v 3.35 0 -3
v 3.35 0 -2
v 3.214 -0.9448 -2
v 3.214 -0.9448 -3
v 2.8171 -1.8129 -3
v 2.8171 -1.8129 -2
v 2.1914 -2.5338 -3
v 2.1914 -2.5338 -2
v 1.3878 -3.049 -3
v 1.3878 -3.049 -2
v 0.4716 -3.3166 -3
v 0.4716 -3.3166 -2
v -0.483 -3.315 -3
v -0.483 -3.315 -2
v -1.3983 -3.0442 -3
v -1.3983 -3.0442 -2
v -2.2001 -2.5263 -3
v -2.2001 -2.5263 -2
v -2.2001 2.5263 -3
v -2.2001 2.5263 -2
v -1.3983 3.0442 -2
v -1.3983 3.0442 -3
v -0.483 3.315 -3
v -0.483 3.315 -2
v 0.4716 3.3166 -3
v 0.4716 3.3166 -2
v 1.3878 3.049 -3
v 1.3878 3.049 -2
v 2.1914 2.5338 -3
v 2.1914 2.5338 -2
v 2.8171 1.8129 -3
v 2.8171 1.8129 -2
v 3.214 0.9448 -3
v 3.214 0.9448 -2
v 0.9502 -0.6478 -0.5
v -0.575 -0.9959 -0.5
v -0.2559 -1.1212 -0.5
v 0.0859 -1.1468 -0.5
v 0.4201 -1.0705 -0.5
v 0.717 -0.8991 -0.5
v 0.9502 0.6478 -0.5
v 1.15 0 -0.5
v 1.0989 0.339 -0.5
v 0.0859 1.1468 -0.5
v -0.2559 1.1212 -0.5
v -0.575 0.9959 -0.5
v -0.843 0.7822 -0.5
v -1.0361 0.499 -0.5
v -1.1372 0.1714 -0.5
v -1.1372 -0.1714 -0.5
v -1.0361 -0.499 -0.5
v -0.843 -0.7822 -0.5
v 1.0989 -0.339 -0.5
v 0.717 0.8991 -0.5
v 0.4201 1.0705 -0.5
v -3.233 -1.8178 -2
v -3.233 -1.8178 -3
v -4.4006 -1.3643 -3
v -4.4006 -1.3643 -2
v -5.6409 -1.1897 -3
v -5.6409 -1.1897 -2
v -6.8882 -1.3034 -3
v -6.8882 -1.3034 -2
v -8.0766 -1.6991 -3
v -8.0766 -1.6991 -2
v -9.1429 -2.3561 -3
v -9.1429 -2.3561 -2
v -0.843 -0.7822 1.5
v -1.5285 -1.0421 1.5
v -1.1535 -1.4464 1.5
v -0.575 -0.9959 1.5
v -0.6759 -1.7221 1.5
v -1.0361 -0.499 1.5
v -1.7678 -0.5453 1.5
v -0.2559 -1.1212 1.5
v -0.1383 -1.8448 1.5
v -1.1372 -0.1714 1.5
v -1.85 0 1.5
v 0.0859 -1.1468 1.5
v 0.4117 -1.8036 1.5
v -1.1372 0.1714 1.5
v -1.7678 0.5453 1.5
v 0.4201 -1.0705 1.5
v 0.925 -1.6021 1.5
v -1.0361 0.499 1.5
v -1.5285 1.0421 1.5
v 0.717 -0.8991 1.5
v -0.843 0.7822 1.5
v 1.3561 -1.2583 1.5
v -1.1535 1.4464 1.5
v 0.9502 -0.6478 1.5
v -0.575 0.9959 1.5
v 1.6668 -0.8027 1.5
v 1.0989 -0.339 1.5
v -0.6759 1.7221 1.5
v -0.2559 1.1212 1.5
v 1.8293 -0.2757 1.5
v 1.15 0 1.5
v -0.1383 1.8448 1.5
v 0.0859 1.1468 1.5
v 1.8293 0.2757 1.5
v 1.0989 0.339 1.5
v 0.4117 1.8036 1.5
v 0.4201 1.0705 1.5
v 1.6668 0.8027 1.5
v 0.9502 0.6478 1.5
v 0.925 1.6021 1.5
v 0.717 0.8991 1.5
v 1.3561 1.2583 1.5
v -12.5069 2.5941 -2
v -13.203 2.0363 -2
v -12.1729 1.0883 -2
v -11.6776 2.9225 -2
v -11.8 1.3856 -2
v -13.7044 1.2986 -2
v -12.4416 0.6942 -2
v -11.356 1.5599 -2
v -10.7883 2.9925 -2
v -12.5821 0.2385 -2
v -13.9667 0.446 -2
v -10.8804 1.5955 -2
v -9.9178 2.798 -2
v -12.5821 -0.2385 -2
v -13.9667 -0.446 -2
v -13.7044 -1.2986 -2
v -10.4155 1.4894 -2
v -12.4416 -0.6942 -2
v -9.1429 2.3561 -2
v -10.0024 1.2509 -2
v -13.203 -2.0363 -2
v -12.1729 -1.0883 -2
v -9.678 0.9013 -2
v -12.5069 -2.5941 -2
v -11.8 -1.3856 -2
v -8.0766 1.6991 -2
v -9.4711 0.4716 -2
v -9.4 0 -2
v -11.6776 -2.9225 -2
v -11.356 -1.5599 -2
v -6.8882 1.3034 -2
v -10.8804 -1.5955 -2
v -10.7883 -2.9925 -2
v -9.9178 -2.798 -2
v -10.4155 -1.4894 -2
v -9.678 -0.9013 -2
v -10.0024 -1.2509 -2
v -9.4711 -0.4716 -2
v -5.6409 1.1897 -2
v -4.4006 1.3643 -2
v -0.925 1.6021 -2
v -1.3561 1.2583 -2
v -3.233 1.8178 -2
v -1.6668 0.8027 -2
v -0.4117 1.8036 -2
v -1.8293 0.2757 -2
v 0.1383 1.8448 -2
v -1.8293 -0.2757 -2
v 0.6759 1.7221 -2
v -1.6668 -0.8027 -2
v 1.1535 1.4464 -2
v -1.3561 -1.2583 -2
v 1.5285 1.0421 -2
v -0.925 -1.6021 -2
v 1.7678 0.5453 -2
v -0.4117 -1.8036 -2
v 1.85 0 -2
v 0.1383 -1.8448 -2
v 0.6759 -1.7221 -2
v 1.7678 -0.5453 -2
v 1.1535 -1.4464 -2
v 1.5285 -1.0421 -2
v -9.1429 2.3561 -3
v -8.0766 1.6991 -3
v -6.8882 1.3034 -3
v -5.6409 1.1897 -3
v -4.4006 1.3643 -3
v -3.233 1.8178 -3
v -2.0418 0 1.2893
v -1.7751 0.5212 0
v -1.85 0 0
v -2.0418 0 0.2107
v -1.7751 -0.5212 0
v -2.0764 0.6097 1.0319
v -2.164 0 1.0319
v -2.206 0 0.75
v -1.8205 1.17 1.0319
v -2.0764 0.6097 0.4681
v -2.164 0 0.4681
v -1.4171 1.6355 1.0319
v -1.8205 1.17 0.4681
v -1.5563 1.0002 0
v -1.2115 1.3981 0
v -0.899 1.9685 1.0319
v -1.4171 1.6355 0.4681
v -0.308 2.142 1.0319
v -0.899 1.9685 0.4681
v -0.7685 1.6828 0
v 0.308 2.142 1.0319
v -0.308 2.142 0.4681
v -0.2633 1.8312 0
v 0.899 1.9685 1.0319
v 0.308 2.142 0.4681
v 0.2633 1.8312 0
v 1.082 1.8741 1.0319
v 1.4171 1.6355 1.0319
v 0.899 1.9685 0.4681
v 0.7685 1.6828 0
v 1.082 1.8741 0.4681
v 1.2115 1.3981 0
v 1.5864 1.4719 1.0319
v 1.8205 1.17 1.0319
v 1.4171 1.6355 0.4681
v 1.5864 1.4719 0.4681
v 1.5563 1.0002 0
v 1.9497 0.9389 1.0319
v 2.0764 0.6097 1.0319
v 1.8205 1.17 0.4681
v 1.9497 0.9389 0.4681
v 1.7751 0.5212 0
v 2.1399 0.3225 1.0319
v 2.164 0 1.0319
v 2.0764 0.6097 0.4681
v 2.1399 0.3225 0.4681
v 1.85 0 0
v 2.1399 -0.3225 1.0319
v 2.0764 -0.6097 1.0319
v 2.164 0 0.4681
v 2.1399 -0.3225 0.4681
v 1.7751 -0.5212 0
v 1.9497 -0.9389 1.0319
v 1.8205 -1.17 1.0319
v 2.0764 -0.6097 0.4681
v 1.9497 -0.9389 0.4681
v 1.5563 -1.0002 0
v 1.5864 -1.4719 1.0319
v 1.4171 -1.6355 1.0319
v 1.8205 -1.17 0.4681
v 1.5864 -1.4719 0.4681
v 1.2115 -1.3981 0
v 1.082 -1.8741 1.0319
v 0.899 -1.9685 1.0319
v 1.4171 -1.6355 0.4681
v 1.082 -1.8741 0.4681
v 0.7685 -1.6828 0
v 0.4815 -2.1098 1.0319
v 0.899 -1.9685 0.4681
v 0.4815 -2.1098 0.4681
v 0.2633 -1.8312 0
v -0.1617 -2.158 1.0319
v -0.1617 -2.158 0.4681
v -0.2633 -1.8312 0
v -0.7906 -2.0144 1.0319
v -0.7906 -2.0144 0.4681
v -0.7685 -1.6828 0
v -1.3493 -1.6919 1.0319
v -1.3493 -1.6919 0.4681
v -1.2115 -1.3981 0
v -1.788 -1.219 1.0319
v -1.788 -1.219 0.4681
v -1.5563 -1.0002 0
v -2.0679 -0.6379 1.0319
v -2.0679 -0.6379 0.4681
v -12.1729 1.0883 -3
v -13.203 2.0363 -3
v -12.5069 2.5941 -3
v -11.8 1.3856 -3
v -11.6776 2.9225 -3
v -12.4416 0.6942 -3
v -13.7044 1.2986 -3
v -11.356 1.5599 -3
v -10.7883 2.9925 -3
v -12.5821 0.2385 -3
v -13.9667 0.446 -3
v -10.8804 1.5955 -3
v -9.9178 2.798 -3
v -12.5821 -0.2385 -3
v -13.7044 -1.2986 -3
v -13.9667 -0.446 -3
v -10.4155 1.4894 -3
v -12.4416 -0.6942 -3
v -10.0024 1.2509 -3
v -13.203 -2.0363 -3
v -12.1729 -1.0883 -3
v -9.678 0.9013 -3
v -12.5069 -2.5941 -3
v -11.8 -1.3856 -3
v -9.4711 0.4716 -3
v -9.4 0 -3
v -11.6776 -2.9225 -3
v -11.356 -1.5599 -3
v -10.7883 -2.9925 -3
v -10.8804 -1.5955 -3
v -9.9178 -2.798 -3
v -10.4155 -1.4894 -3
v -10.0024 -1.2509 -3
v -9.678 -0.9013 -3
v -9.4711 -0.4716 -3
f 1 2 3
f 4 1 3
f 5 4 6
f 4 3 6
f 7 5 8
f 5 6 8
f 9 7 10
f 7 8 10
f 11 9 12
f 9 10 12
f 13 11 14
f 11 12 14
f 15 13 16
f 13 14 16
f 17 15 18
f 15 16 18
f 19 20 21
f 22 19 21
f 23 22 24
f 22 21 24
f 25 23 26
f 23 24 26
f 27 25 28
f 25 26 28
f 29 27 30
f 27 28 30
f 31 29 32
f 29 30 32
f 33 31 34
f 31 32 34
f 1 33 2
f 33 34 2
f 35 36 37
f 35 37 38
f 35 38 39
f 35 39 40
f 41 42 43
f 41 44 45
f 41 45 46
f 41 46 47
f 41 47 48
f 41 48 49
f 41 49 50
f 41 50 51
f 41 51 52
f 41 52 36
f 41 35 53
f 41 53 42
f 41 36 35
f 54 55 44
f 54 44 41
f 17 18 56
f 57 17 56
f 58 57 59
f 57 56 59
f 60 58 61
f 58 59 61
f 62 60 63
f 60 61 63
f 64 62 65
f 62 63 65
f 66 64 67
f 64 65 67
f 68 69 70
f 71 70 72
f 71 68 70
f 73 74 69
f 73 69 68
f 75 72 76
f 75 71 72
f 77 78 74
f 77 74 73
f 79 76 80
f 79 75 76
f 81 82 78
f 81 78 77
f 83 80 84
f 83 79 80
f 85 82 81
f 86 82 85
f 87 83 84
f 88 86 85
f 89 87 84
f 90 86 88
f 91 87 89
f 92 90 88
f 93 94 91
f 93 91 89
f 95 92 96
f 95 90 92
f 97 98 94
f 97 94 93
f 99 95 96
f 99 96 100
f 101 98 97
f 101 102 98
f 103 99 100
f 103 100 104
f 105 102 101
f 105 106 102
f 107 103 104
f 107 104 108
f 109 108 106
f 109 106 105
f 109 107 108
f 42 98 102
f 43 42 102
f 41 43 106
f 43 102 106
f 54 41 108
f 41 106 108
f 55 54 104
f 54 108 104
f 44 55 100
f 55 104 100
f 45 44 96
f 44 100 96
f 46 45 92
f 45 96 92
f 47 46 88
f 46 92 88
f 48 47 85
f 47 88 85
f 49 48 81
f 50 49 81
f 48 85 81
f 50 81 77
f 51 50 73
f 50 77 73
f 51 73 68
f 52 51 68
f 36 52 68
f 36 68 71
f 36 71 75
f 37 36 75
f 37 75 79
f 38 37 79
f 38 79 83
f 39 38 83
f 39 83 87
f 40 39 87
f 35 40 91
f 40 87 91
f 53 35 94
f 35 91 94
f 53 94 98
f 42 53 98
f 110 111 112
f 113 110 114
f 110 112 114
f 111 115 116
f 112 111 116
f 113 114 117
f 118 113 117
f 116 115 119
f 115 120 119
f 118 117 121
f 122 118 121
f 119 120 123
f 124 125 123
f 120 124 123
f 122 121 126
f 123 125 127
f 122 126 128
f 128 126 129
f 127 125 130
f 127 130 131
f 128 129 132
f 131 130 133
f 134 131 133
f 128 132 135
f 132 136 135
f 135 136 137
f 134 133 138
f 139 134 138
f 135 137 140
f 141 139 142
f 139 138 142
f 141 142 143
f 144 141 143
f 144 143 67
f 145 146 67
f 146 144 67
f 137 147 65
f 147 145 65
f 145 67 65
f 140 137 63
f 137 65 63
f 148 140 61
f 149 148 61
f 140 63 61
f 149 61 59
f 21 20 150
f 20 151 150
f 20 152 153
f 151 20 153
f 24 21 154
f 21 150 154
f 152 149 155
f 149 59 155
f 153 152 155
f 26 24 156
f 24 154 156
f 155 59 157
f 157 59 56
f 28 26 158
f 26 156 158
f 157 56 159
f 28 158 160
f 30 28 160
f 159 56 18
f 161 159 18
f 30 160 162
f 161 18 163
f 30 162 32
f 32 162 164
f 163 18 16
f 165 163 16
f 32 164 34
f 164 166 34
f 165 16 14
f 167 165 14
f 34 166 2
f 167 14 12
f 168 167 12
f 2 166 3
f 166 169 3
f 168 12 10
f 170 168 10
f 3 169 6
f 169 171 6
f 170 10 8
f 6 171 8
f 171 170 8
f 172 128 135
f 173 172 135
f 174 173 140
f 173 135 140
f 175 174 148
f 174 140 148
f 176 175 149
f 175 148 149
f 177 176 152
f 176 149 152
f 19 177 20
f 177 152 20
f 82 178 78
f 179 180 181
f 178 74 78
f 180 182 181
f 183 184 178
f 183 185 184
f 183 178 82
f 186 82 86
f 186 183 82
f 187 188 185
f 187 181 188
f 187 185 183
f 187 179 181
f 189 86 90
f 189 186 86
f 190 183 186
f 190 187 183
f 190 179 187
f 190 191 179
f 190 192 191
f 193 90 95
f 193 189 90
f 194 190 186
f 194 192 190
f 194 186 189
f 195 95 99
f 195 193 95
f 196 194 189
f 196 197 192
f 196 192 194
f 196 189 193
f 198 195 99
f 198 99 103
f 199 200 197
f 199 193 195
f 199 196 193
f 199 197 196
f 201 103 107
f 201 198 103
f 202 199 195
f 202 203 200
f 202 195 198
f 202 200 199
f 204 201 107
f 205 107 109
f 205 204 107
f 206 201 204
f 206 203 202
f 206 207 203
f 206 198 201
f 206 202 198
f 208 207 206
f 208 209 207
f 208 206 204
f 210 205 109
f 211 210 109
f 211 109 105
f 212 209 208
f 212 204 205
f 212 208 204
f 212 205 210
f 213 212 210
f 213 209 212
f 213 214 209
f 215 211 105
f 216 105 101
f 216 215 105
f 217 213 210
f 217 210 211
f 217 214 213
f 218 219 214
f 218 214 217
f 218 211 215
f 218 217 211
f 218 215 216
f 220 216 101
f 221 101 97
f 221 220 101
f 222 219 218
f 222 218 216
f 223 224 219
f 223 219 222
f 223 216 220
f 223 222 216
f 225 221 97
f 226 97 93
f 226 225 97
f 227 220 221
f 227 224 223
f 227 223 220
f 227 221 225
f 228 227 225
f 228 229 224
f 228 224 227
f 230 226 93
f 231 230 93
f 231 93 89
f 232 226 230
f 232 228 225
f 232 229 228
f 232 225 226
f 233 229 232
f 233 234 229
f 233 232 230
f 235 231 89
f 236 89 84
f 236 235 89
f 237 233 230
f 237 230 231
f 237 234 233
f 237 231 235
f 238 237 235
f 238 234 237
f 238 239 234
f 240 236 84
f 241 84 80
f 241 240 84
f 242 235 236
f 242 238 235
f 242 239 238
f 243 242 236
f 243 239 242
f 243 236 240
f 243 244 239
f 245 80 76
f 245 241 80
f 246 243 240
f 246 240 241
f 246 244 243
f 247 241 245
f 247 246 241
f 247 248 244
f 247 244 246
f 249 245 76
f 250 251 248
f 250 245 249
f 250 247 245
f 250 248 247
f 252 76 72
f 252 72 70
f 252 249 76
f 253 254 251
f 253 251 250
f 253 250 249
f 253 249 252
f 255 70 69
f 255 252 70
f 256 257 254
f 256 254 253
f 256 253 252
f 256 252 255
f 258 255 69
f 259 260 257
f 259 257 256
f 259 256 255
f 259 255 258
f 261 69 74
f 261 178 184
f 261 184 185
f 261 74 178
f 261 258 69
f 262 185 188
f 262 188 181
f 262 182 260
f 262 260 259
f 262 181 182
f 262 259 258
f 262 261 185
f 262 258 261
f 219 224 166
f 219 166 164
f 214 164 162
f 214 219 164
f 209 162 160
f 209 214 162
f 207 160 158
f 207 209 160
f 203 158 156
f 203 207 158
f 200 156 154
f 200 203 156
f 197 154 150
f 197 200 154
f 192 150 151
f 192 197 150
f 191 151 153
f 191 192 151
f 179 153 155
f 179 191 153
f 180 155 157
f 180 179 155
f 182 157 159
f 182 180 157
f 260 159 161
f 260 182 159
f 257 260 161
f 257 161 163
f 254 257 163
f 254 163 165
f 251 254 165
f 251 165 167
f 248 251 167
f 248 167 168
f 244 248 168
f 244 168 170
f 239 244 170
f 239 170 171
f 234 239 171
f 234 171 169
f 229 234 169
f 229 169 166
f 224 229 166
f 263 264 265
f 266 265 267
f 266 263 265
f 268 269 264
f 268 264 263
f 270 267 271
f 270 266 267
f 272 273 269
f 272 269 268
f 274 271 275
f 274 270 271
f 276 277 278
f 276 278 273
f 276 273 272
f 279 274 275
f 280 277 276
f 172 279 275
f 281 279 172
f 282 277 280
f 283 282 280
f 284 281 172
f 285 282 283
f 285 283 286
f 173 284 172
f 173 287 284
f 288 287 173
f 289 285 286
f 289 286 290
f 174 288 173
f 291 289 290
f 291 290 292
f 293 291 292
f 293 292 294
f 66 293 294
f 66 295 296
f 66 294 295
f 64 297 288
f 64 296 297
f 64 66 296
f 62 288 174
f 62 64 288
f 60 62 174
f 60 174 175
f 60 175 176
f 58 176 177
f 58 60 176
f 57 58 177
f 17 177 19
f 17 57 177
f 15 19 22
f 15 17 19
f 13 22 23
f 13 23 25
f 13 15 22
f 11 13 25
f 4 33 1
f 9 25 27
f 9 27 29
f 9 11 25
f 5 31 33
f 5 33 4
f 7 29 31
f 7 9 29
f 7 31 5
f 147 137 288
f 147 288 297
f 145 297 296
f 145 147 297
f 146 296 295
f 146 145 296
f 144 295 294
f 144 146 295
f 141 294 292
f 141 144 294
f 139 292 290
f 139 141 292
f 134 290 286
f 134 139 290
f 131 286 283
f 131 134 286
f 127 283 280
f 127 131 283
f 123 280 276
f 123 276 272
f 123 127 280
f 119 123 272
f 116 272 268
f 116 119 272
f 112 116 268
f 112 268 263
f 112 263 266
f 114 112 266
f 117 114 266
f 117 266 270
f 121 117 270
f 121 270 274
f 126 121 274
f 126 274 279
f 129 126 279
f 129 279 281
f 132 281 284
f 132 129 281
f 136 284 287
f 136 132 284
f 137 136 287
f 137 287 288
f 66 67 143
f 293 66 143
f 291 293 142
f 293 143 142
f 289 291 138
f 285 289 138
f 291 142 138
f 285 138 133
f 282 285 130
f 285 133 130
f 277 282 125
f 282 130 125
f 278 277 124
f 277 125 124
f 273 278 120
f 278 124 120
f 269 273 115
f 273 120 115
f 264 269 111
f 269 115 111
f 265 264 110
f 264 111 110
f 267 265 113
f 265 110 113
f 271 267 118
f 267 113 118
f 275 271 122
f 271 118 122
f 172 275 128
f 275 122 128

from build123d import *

# Parameters (mm, degrees)
F0_R     = 1.85
F3_DEPTH = 2
F4_R     = 1.85
F4_R_2   = 1.6
F5_DEPTH = 1
F6_R     = 1.15
F7_DEPTH = 2


with BuildPart() as f2:
    # F1 (on Front) → F2 (revolve)
    with BuildSketch(Plane.XZ):
        with BuildLine():
            Line((0, 0), (0, 1.5))
            Line((0, 1.5), (-1.85, 1.5))
            ThreePointArc((-1.85, 1.5), (-2.2059803133, 0.75), (-1.85, 0))
            Line((-1.85, 0), (0, 0))
        make_face()
    revolve(axis=Axis((0, 0, 0.75), (0, 0, -1)))

    # F0 (on Top) → F3 (join)
    with BuildSketch(Plane.XY):
        Circle(F0_R)
    extrude(amount=-F3_DEPTH)

    # F4 (on face) → F5 (join)
    with BuildSketch(Plane(origin=(0, 0, -2), x_dir=(1, 0, 0), z_dir=(0, 0, -1))):
        with BuildLine():
            ThreePointArc((-2.2001077956, -2.526267145), (1.3878290393, -3.0490048471), (3.35, 0))
            ThreePointArc((3.35, 0), (1.3878290393, 3.0490048471), (-2.2001077956, 2.526267145))
            ThreePointArc((-2.2001077956, 2.526267145), (-3.35, 0), (-2.2001077956, -2.526267145))
        make_face()
        Circle(F4_R, mode=Mode.SUBTRACT)
        with BuildLine():
            ThreePointArc((-8, 0), (-8.3008157574, 1.3093526739), (-9.142936283, 2.3561227369))
            ThreePointArc((-9.142936283, 2.3561227369), (-14, 0), (-9.142936283, -2.3561227369))
            ThreePointArc((-9.142936283, -2.3561227369), (-8.3008157574, -1.3093526739), (-8, 0))
        make_face()
        with Locations((-11, 0)):
            Circle(F4_R_2, mode=Mode.SUBTRACT)
        with BuildLine():
            ThreePointArc((-2.2001077956, -2.526267145), (-3.35, 0), (-2.2001077956, 2.526267145))
            ThreePointArc((-2.2001077956, 2.526267145), (-5.640853454, 1.1897478328), (-9.142936283, 2.3561227369))
            ThreePointArc((-9.142936283, 2.3561227369), (-8.3008157574, 1.3093526739), (-8, 0))
            ThreePointArc((-8, 0), (-8.3008157574, -1.3093526739), (-9.142936283, -2.3561227369))
            ThreePointArc((-9.142936283, -2.3561227369), (-5.640853454, -1.1897478328), (-2.2001077956, -2.526267145))
        make_face()
        Circle(F4_R)
    extrude(amount=F5_DEPTH)

    # F6 (on face) → F7 (cut)
    with BuildSketch(Plane.XY.offset(1.5)):
        Circle(F6_R)
    extrude(amount=-F7_DEPTH, mode=Mode.SUBTRACT)


solid = f2.part
